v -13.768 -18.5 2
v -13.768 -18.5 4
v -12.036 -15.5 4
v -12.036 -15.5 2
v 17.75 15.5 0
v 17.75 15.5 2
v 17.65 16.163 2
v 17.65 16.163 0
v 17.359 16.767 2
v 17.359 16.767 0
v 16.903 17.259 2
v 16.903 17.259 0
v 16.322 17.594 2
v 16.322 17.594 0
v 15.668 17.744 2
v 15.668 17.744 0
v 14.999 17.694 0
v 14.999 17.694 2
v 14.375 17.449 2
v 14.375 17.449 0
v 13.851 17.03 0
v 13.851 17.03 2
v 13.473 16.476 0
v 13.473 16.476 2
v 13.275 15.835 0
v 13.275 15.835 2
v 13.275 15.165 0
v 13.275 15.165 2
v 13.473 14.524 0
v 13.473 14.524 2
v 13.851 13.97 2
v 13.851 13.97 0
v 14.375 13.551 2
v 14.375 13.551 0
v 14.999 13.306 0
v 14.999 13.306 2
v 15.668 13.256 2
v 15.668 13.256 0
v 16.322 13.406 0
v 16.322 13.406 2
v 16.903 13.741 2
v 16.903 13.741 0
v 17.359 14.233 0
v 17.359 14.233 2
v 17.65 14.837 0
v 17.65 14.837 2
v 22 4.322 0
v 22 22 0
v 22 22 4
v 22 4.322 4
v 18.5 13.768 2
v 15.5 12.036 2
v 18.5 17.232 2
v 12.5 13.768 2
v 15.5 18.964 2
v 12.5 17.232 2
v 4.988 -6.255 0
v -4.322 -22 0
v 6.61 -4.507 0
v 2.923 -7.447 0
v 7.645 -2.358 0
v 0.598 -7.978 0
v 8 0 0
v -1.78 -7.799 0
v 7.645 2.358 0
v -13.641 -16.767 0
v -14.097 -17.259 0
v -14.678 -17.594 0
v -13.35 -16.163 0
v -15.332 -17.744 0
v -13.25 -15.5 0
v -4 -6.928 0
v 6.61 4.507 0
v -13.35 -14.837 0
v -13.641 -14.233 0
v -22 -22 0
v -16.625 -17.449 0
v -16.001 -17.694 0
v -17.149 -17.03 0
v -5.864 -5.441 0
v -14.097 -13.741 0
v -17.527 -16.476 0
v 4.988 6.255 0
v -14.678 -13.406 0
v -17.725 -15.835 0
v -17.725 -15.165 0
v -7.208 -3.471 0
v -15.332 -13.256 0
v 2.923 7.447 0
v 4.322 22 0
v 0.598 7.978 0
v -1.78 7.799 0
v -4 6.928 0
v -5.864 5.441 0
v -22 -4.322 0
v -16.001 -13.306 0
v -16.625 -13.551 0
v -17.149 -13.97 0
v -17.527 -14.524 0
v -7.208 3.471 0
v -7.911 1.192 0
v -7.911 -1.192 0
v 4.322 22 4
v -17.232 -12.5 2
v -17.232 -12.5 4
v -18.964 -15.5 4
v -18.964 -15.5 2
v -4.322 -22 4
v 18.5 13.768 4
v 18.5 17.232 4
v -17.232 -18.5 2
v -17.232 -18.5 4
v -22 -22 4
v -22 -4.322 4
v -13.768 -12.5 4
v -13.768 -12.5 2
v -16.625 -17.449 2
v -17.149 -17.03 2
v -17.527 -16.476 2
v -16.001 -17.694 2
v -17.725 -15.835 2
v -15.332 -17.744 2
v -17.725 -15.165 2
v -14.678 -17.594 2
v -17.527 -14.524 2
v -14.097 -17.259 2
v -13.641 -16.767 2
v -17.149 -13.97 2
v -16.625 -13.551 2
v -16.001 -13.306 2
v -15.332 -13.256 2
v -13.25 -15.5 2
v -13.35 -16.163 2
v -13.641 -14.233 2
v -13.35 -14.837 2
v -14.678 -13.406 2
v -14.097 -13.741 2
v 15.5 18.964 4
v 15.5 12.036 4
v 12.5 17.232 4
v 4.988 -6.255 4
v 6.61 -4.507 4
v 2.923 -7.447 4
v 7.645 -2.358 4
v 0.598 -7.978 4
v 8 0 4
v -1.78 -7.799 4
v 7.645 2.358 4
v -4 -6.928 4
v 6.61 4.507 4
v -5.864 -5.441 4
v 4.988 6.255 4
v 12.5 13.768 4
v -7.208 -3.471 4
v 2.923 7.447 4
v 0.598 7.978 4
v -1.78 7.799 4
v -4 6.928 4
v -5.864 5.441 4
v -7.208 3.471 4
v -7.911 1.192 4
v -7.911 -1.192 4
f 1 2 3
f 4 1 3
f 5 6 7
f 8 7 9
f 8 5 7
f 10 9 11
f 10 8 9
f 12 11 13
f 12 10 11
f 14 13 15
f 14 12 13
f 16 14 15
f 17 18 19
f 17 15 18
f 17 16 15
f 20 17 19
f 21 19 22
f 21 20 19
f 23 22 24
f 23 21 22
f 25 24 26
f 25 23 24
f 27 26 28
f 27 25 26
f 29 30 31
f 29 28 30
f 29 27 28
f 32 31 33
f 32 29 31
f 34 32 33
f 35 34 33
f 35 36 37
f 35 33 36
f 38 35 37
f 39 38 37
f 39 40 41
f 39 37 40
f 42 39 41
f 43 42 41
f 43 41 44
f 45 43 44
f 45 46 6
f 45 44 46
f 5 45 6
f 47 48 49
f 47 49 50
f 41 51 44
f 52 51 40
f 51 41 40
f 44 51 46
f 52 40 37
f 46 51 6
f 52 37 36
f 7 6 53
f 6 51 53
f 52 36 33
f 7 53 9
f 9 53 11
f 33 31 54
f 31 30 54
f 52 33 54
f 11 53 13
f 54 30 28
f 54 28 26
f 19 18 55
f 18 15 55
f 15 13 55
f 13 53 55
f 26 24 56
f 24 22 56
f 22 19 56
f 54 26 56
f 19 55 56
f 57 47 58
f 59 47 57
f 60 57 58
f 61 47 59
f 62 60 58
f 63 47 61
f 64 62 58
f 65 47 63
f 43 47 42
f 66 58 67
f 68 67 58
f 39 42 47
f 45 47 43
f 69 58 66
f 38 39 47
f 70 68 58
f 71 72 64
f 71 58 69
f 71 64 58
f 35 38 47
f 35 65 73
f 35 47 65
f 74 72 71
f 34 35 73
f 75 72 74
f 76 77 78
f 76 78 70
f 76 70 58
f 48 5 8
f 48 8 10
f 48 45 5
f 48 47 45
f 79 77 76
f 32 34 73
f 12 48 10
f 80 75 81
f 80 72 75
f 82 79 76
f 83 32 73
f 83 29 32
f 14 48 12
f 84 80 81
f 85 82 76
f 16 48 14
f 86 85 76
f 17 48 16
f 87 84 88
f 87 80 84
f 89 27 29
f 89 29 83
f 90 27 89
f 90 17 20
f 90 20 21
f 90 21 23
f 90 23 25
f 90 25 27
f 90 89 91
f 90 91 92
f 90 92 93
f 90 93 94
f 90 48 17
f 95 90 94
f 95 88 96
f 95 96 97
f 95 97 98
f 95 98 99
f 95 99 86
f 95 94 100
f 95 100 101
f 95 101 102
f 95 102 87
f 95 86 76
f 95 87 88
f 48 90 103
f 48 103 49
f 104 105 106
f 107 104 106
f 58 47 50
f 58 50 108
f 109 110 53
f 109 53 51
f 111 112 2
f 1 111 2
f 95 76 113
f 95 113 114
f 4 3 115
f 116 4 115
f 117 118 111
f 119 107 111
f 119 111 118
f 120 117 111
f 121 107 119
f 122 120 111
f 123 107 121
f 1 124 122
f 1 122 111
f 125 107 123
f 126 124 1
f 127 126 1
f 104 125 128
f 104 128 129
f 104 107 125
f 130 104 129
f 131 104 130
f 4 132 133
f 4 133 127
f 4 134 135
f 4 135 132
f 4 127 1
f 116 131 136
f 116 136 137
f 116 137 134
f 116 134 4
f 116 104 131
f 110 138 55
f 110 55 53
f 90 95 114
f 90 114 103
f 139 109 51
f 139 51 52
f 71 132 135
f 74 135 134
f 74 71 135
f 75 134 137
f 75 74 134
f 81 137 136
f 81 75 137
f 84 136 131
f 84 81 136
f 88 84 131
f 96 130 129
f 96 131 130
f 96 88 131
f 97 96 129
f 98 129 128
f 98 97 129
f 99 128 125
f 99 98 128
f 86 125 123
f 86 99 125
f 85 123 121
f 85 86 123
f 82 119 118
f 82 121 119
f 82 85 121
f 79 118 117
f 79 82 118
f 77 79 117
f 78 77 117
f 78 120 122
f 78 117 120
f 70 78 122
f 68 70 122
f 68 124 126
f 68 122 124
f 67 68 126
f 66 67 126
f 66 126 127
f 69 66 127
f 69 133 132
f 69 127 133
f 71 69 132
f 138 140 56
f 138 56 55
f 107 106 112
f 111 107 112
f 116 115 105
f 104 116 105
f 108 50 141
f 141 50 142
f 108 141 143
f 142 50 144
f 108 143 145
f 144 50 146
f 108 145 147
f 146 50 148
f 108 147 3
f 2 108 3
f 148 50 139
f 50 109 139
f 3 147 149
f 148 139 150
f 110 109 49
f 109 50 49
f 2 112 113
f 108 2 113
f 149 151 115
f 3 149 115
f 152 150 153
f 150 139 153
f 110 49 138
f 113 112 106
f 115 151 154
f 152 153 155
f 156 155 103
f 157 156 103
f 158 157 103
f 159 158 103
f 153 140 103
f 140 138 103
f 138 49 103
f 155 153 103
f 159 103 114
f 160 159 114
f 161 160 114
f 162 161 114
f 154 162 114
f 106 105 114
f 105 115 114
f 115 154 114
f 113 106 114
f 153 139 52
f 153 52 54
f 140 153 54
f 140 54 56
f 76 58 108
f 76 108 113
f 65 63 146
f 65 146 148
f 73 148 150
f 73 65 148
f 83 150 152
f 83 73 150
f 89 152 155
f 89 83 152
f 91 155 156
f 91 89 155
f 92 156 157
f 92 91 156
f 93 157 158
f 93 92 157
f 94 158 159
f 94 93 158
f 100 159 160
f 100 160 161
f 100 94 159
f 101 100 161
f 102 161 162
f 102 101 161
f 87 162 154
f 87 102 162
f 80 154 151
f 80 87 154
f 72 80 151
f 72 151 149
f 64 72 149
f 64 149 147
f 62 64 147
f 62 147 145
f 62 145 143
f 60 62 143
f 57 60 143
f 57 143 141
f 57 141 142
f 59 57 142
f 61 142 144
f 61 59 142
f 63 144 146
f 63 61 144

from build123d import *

# Parameters (mm, degrees)
SKETCH1_R           = 8
SKETCH1_R_2         = 2.25
BOSS_EXTRUDE1_DEPTH = 4
CUT_EXTRUDE1_DEPTH  = 2


with BuildPart() as part:
    # Sketch1 → Boss-Extrude1 (new body)
    with BuildSketch(Plane.XY):
        Polygon((-4.32233047, -22), (-22, -22), (-22, -4.32233047), (4.32233047, 22), (22, 22), (22, 4.32233047), align=None)
        Circle(SKETCH1_R, mode=Mode.SUBTRACT)
        with Locations((-15.5, -15.5)):
            Circle(SKETCH1_R_2, mode=Mode.SUBTRACT)
        with Locations((15.5, 15.5)):
            Circle(SKETCH1_R_2, mode=Mode.SUBTRACT)
    extrude(amount=BOSS_EXTRUDE1_DEPTH)

    # Sketch2 → Cut-Extrude1 (cut)
    with BuildSketch(Plane.XY.offset(4)):
        Polygon((-18.964101615, -15.5), (-17.232050808, -18.5), (-13.767949192, -18.5), (-12.035898385, -15.5), (-13.767949192, -12.5), (-17.232050808, -12.5), align=None)
        Polygon((12.5, 13.767949192), (12.5, 17.232050808), (15.5, 18.964101615), (18.5, 17.232050808), (18.5, 13.767949192), (15.5, 12.035898385), align=None)
    extrude(amount=-CUT_EXTRUDE1_DEPTH, mode=Mode.SUBTRACT)


solid = part.part
